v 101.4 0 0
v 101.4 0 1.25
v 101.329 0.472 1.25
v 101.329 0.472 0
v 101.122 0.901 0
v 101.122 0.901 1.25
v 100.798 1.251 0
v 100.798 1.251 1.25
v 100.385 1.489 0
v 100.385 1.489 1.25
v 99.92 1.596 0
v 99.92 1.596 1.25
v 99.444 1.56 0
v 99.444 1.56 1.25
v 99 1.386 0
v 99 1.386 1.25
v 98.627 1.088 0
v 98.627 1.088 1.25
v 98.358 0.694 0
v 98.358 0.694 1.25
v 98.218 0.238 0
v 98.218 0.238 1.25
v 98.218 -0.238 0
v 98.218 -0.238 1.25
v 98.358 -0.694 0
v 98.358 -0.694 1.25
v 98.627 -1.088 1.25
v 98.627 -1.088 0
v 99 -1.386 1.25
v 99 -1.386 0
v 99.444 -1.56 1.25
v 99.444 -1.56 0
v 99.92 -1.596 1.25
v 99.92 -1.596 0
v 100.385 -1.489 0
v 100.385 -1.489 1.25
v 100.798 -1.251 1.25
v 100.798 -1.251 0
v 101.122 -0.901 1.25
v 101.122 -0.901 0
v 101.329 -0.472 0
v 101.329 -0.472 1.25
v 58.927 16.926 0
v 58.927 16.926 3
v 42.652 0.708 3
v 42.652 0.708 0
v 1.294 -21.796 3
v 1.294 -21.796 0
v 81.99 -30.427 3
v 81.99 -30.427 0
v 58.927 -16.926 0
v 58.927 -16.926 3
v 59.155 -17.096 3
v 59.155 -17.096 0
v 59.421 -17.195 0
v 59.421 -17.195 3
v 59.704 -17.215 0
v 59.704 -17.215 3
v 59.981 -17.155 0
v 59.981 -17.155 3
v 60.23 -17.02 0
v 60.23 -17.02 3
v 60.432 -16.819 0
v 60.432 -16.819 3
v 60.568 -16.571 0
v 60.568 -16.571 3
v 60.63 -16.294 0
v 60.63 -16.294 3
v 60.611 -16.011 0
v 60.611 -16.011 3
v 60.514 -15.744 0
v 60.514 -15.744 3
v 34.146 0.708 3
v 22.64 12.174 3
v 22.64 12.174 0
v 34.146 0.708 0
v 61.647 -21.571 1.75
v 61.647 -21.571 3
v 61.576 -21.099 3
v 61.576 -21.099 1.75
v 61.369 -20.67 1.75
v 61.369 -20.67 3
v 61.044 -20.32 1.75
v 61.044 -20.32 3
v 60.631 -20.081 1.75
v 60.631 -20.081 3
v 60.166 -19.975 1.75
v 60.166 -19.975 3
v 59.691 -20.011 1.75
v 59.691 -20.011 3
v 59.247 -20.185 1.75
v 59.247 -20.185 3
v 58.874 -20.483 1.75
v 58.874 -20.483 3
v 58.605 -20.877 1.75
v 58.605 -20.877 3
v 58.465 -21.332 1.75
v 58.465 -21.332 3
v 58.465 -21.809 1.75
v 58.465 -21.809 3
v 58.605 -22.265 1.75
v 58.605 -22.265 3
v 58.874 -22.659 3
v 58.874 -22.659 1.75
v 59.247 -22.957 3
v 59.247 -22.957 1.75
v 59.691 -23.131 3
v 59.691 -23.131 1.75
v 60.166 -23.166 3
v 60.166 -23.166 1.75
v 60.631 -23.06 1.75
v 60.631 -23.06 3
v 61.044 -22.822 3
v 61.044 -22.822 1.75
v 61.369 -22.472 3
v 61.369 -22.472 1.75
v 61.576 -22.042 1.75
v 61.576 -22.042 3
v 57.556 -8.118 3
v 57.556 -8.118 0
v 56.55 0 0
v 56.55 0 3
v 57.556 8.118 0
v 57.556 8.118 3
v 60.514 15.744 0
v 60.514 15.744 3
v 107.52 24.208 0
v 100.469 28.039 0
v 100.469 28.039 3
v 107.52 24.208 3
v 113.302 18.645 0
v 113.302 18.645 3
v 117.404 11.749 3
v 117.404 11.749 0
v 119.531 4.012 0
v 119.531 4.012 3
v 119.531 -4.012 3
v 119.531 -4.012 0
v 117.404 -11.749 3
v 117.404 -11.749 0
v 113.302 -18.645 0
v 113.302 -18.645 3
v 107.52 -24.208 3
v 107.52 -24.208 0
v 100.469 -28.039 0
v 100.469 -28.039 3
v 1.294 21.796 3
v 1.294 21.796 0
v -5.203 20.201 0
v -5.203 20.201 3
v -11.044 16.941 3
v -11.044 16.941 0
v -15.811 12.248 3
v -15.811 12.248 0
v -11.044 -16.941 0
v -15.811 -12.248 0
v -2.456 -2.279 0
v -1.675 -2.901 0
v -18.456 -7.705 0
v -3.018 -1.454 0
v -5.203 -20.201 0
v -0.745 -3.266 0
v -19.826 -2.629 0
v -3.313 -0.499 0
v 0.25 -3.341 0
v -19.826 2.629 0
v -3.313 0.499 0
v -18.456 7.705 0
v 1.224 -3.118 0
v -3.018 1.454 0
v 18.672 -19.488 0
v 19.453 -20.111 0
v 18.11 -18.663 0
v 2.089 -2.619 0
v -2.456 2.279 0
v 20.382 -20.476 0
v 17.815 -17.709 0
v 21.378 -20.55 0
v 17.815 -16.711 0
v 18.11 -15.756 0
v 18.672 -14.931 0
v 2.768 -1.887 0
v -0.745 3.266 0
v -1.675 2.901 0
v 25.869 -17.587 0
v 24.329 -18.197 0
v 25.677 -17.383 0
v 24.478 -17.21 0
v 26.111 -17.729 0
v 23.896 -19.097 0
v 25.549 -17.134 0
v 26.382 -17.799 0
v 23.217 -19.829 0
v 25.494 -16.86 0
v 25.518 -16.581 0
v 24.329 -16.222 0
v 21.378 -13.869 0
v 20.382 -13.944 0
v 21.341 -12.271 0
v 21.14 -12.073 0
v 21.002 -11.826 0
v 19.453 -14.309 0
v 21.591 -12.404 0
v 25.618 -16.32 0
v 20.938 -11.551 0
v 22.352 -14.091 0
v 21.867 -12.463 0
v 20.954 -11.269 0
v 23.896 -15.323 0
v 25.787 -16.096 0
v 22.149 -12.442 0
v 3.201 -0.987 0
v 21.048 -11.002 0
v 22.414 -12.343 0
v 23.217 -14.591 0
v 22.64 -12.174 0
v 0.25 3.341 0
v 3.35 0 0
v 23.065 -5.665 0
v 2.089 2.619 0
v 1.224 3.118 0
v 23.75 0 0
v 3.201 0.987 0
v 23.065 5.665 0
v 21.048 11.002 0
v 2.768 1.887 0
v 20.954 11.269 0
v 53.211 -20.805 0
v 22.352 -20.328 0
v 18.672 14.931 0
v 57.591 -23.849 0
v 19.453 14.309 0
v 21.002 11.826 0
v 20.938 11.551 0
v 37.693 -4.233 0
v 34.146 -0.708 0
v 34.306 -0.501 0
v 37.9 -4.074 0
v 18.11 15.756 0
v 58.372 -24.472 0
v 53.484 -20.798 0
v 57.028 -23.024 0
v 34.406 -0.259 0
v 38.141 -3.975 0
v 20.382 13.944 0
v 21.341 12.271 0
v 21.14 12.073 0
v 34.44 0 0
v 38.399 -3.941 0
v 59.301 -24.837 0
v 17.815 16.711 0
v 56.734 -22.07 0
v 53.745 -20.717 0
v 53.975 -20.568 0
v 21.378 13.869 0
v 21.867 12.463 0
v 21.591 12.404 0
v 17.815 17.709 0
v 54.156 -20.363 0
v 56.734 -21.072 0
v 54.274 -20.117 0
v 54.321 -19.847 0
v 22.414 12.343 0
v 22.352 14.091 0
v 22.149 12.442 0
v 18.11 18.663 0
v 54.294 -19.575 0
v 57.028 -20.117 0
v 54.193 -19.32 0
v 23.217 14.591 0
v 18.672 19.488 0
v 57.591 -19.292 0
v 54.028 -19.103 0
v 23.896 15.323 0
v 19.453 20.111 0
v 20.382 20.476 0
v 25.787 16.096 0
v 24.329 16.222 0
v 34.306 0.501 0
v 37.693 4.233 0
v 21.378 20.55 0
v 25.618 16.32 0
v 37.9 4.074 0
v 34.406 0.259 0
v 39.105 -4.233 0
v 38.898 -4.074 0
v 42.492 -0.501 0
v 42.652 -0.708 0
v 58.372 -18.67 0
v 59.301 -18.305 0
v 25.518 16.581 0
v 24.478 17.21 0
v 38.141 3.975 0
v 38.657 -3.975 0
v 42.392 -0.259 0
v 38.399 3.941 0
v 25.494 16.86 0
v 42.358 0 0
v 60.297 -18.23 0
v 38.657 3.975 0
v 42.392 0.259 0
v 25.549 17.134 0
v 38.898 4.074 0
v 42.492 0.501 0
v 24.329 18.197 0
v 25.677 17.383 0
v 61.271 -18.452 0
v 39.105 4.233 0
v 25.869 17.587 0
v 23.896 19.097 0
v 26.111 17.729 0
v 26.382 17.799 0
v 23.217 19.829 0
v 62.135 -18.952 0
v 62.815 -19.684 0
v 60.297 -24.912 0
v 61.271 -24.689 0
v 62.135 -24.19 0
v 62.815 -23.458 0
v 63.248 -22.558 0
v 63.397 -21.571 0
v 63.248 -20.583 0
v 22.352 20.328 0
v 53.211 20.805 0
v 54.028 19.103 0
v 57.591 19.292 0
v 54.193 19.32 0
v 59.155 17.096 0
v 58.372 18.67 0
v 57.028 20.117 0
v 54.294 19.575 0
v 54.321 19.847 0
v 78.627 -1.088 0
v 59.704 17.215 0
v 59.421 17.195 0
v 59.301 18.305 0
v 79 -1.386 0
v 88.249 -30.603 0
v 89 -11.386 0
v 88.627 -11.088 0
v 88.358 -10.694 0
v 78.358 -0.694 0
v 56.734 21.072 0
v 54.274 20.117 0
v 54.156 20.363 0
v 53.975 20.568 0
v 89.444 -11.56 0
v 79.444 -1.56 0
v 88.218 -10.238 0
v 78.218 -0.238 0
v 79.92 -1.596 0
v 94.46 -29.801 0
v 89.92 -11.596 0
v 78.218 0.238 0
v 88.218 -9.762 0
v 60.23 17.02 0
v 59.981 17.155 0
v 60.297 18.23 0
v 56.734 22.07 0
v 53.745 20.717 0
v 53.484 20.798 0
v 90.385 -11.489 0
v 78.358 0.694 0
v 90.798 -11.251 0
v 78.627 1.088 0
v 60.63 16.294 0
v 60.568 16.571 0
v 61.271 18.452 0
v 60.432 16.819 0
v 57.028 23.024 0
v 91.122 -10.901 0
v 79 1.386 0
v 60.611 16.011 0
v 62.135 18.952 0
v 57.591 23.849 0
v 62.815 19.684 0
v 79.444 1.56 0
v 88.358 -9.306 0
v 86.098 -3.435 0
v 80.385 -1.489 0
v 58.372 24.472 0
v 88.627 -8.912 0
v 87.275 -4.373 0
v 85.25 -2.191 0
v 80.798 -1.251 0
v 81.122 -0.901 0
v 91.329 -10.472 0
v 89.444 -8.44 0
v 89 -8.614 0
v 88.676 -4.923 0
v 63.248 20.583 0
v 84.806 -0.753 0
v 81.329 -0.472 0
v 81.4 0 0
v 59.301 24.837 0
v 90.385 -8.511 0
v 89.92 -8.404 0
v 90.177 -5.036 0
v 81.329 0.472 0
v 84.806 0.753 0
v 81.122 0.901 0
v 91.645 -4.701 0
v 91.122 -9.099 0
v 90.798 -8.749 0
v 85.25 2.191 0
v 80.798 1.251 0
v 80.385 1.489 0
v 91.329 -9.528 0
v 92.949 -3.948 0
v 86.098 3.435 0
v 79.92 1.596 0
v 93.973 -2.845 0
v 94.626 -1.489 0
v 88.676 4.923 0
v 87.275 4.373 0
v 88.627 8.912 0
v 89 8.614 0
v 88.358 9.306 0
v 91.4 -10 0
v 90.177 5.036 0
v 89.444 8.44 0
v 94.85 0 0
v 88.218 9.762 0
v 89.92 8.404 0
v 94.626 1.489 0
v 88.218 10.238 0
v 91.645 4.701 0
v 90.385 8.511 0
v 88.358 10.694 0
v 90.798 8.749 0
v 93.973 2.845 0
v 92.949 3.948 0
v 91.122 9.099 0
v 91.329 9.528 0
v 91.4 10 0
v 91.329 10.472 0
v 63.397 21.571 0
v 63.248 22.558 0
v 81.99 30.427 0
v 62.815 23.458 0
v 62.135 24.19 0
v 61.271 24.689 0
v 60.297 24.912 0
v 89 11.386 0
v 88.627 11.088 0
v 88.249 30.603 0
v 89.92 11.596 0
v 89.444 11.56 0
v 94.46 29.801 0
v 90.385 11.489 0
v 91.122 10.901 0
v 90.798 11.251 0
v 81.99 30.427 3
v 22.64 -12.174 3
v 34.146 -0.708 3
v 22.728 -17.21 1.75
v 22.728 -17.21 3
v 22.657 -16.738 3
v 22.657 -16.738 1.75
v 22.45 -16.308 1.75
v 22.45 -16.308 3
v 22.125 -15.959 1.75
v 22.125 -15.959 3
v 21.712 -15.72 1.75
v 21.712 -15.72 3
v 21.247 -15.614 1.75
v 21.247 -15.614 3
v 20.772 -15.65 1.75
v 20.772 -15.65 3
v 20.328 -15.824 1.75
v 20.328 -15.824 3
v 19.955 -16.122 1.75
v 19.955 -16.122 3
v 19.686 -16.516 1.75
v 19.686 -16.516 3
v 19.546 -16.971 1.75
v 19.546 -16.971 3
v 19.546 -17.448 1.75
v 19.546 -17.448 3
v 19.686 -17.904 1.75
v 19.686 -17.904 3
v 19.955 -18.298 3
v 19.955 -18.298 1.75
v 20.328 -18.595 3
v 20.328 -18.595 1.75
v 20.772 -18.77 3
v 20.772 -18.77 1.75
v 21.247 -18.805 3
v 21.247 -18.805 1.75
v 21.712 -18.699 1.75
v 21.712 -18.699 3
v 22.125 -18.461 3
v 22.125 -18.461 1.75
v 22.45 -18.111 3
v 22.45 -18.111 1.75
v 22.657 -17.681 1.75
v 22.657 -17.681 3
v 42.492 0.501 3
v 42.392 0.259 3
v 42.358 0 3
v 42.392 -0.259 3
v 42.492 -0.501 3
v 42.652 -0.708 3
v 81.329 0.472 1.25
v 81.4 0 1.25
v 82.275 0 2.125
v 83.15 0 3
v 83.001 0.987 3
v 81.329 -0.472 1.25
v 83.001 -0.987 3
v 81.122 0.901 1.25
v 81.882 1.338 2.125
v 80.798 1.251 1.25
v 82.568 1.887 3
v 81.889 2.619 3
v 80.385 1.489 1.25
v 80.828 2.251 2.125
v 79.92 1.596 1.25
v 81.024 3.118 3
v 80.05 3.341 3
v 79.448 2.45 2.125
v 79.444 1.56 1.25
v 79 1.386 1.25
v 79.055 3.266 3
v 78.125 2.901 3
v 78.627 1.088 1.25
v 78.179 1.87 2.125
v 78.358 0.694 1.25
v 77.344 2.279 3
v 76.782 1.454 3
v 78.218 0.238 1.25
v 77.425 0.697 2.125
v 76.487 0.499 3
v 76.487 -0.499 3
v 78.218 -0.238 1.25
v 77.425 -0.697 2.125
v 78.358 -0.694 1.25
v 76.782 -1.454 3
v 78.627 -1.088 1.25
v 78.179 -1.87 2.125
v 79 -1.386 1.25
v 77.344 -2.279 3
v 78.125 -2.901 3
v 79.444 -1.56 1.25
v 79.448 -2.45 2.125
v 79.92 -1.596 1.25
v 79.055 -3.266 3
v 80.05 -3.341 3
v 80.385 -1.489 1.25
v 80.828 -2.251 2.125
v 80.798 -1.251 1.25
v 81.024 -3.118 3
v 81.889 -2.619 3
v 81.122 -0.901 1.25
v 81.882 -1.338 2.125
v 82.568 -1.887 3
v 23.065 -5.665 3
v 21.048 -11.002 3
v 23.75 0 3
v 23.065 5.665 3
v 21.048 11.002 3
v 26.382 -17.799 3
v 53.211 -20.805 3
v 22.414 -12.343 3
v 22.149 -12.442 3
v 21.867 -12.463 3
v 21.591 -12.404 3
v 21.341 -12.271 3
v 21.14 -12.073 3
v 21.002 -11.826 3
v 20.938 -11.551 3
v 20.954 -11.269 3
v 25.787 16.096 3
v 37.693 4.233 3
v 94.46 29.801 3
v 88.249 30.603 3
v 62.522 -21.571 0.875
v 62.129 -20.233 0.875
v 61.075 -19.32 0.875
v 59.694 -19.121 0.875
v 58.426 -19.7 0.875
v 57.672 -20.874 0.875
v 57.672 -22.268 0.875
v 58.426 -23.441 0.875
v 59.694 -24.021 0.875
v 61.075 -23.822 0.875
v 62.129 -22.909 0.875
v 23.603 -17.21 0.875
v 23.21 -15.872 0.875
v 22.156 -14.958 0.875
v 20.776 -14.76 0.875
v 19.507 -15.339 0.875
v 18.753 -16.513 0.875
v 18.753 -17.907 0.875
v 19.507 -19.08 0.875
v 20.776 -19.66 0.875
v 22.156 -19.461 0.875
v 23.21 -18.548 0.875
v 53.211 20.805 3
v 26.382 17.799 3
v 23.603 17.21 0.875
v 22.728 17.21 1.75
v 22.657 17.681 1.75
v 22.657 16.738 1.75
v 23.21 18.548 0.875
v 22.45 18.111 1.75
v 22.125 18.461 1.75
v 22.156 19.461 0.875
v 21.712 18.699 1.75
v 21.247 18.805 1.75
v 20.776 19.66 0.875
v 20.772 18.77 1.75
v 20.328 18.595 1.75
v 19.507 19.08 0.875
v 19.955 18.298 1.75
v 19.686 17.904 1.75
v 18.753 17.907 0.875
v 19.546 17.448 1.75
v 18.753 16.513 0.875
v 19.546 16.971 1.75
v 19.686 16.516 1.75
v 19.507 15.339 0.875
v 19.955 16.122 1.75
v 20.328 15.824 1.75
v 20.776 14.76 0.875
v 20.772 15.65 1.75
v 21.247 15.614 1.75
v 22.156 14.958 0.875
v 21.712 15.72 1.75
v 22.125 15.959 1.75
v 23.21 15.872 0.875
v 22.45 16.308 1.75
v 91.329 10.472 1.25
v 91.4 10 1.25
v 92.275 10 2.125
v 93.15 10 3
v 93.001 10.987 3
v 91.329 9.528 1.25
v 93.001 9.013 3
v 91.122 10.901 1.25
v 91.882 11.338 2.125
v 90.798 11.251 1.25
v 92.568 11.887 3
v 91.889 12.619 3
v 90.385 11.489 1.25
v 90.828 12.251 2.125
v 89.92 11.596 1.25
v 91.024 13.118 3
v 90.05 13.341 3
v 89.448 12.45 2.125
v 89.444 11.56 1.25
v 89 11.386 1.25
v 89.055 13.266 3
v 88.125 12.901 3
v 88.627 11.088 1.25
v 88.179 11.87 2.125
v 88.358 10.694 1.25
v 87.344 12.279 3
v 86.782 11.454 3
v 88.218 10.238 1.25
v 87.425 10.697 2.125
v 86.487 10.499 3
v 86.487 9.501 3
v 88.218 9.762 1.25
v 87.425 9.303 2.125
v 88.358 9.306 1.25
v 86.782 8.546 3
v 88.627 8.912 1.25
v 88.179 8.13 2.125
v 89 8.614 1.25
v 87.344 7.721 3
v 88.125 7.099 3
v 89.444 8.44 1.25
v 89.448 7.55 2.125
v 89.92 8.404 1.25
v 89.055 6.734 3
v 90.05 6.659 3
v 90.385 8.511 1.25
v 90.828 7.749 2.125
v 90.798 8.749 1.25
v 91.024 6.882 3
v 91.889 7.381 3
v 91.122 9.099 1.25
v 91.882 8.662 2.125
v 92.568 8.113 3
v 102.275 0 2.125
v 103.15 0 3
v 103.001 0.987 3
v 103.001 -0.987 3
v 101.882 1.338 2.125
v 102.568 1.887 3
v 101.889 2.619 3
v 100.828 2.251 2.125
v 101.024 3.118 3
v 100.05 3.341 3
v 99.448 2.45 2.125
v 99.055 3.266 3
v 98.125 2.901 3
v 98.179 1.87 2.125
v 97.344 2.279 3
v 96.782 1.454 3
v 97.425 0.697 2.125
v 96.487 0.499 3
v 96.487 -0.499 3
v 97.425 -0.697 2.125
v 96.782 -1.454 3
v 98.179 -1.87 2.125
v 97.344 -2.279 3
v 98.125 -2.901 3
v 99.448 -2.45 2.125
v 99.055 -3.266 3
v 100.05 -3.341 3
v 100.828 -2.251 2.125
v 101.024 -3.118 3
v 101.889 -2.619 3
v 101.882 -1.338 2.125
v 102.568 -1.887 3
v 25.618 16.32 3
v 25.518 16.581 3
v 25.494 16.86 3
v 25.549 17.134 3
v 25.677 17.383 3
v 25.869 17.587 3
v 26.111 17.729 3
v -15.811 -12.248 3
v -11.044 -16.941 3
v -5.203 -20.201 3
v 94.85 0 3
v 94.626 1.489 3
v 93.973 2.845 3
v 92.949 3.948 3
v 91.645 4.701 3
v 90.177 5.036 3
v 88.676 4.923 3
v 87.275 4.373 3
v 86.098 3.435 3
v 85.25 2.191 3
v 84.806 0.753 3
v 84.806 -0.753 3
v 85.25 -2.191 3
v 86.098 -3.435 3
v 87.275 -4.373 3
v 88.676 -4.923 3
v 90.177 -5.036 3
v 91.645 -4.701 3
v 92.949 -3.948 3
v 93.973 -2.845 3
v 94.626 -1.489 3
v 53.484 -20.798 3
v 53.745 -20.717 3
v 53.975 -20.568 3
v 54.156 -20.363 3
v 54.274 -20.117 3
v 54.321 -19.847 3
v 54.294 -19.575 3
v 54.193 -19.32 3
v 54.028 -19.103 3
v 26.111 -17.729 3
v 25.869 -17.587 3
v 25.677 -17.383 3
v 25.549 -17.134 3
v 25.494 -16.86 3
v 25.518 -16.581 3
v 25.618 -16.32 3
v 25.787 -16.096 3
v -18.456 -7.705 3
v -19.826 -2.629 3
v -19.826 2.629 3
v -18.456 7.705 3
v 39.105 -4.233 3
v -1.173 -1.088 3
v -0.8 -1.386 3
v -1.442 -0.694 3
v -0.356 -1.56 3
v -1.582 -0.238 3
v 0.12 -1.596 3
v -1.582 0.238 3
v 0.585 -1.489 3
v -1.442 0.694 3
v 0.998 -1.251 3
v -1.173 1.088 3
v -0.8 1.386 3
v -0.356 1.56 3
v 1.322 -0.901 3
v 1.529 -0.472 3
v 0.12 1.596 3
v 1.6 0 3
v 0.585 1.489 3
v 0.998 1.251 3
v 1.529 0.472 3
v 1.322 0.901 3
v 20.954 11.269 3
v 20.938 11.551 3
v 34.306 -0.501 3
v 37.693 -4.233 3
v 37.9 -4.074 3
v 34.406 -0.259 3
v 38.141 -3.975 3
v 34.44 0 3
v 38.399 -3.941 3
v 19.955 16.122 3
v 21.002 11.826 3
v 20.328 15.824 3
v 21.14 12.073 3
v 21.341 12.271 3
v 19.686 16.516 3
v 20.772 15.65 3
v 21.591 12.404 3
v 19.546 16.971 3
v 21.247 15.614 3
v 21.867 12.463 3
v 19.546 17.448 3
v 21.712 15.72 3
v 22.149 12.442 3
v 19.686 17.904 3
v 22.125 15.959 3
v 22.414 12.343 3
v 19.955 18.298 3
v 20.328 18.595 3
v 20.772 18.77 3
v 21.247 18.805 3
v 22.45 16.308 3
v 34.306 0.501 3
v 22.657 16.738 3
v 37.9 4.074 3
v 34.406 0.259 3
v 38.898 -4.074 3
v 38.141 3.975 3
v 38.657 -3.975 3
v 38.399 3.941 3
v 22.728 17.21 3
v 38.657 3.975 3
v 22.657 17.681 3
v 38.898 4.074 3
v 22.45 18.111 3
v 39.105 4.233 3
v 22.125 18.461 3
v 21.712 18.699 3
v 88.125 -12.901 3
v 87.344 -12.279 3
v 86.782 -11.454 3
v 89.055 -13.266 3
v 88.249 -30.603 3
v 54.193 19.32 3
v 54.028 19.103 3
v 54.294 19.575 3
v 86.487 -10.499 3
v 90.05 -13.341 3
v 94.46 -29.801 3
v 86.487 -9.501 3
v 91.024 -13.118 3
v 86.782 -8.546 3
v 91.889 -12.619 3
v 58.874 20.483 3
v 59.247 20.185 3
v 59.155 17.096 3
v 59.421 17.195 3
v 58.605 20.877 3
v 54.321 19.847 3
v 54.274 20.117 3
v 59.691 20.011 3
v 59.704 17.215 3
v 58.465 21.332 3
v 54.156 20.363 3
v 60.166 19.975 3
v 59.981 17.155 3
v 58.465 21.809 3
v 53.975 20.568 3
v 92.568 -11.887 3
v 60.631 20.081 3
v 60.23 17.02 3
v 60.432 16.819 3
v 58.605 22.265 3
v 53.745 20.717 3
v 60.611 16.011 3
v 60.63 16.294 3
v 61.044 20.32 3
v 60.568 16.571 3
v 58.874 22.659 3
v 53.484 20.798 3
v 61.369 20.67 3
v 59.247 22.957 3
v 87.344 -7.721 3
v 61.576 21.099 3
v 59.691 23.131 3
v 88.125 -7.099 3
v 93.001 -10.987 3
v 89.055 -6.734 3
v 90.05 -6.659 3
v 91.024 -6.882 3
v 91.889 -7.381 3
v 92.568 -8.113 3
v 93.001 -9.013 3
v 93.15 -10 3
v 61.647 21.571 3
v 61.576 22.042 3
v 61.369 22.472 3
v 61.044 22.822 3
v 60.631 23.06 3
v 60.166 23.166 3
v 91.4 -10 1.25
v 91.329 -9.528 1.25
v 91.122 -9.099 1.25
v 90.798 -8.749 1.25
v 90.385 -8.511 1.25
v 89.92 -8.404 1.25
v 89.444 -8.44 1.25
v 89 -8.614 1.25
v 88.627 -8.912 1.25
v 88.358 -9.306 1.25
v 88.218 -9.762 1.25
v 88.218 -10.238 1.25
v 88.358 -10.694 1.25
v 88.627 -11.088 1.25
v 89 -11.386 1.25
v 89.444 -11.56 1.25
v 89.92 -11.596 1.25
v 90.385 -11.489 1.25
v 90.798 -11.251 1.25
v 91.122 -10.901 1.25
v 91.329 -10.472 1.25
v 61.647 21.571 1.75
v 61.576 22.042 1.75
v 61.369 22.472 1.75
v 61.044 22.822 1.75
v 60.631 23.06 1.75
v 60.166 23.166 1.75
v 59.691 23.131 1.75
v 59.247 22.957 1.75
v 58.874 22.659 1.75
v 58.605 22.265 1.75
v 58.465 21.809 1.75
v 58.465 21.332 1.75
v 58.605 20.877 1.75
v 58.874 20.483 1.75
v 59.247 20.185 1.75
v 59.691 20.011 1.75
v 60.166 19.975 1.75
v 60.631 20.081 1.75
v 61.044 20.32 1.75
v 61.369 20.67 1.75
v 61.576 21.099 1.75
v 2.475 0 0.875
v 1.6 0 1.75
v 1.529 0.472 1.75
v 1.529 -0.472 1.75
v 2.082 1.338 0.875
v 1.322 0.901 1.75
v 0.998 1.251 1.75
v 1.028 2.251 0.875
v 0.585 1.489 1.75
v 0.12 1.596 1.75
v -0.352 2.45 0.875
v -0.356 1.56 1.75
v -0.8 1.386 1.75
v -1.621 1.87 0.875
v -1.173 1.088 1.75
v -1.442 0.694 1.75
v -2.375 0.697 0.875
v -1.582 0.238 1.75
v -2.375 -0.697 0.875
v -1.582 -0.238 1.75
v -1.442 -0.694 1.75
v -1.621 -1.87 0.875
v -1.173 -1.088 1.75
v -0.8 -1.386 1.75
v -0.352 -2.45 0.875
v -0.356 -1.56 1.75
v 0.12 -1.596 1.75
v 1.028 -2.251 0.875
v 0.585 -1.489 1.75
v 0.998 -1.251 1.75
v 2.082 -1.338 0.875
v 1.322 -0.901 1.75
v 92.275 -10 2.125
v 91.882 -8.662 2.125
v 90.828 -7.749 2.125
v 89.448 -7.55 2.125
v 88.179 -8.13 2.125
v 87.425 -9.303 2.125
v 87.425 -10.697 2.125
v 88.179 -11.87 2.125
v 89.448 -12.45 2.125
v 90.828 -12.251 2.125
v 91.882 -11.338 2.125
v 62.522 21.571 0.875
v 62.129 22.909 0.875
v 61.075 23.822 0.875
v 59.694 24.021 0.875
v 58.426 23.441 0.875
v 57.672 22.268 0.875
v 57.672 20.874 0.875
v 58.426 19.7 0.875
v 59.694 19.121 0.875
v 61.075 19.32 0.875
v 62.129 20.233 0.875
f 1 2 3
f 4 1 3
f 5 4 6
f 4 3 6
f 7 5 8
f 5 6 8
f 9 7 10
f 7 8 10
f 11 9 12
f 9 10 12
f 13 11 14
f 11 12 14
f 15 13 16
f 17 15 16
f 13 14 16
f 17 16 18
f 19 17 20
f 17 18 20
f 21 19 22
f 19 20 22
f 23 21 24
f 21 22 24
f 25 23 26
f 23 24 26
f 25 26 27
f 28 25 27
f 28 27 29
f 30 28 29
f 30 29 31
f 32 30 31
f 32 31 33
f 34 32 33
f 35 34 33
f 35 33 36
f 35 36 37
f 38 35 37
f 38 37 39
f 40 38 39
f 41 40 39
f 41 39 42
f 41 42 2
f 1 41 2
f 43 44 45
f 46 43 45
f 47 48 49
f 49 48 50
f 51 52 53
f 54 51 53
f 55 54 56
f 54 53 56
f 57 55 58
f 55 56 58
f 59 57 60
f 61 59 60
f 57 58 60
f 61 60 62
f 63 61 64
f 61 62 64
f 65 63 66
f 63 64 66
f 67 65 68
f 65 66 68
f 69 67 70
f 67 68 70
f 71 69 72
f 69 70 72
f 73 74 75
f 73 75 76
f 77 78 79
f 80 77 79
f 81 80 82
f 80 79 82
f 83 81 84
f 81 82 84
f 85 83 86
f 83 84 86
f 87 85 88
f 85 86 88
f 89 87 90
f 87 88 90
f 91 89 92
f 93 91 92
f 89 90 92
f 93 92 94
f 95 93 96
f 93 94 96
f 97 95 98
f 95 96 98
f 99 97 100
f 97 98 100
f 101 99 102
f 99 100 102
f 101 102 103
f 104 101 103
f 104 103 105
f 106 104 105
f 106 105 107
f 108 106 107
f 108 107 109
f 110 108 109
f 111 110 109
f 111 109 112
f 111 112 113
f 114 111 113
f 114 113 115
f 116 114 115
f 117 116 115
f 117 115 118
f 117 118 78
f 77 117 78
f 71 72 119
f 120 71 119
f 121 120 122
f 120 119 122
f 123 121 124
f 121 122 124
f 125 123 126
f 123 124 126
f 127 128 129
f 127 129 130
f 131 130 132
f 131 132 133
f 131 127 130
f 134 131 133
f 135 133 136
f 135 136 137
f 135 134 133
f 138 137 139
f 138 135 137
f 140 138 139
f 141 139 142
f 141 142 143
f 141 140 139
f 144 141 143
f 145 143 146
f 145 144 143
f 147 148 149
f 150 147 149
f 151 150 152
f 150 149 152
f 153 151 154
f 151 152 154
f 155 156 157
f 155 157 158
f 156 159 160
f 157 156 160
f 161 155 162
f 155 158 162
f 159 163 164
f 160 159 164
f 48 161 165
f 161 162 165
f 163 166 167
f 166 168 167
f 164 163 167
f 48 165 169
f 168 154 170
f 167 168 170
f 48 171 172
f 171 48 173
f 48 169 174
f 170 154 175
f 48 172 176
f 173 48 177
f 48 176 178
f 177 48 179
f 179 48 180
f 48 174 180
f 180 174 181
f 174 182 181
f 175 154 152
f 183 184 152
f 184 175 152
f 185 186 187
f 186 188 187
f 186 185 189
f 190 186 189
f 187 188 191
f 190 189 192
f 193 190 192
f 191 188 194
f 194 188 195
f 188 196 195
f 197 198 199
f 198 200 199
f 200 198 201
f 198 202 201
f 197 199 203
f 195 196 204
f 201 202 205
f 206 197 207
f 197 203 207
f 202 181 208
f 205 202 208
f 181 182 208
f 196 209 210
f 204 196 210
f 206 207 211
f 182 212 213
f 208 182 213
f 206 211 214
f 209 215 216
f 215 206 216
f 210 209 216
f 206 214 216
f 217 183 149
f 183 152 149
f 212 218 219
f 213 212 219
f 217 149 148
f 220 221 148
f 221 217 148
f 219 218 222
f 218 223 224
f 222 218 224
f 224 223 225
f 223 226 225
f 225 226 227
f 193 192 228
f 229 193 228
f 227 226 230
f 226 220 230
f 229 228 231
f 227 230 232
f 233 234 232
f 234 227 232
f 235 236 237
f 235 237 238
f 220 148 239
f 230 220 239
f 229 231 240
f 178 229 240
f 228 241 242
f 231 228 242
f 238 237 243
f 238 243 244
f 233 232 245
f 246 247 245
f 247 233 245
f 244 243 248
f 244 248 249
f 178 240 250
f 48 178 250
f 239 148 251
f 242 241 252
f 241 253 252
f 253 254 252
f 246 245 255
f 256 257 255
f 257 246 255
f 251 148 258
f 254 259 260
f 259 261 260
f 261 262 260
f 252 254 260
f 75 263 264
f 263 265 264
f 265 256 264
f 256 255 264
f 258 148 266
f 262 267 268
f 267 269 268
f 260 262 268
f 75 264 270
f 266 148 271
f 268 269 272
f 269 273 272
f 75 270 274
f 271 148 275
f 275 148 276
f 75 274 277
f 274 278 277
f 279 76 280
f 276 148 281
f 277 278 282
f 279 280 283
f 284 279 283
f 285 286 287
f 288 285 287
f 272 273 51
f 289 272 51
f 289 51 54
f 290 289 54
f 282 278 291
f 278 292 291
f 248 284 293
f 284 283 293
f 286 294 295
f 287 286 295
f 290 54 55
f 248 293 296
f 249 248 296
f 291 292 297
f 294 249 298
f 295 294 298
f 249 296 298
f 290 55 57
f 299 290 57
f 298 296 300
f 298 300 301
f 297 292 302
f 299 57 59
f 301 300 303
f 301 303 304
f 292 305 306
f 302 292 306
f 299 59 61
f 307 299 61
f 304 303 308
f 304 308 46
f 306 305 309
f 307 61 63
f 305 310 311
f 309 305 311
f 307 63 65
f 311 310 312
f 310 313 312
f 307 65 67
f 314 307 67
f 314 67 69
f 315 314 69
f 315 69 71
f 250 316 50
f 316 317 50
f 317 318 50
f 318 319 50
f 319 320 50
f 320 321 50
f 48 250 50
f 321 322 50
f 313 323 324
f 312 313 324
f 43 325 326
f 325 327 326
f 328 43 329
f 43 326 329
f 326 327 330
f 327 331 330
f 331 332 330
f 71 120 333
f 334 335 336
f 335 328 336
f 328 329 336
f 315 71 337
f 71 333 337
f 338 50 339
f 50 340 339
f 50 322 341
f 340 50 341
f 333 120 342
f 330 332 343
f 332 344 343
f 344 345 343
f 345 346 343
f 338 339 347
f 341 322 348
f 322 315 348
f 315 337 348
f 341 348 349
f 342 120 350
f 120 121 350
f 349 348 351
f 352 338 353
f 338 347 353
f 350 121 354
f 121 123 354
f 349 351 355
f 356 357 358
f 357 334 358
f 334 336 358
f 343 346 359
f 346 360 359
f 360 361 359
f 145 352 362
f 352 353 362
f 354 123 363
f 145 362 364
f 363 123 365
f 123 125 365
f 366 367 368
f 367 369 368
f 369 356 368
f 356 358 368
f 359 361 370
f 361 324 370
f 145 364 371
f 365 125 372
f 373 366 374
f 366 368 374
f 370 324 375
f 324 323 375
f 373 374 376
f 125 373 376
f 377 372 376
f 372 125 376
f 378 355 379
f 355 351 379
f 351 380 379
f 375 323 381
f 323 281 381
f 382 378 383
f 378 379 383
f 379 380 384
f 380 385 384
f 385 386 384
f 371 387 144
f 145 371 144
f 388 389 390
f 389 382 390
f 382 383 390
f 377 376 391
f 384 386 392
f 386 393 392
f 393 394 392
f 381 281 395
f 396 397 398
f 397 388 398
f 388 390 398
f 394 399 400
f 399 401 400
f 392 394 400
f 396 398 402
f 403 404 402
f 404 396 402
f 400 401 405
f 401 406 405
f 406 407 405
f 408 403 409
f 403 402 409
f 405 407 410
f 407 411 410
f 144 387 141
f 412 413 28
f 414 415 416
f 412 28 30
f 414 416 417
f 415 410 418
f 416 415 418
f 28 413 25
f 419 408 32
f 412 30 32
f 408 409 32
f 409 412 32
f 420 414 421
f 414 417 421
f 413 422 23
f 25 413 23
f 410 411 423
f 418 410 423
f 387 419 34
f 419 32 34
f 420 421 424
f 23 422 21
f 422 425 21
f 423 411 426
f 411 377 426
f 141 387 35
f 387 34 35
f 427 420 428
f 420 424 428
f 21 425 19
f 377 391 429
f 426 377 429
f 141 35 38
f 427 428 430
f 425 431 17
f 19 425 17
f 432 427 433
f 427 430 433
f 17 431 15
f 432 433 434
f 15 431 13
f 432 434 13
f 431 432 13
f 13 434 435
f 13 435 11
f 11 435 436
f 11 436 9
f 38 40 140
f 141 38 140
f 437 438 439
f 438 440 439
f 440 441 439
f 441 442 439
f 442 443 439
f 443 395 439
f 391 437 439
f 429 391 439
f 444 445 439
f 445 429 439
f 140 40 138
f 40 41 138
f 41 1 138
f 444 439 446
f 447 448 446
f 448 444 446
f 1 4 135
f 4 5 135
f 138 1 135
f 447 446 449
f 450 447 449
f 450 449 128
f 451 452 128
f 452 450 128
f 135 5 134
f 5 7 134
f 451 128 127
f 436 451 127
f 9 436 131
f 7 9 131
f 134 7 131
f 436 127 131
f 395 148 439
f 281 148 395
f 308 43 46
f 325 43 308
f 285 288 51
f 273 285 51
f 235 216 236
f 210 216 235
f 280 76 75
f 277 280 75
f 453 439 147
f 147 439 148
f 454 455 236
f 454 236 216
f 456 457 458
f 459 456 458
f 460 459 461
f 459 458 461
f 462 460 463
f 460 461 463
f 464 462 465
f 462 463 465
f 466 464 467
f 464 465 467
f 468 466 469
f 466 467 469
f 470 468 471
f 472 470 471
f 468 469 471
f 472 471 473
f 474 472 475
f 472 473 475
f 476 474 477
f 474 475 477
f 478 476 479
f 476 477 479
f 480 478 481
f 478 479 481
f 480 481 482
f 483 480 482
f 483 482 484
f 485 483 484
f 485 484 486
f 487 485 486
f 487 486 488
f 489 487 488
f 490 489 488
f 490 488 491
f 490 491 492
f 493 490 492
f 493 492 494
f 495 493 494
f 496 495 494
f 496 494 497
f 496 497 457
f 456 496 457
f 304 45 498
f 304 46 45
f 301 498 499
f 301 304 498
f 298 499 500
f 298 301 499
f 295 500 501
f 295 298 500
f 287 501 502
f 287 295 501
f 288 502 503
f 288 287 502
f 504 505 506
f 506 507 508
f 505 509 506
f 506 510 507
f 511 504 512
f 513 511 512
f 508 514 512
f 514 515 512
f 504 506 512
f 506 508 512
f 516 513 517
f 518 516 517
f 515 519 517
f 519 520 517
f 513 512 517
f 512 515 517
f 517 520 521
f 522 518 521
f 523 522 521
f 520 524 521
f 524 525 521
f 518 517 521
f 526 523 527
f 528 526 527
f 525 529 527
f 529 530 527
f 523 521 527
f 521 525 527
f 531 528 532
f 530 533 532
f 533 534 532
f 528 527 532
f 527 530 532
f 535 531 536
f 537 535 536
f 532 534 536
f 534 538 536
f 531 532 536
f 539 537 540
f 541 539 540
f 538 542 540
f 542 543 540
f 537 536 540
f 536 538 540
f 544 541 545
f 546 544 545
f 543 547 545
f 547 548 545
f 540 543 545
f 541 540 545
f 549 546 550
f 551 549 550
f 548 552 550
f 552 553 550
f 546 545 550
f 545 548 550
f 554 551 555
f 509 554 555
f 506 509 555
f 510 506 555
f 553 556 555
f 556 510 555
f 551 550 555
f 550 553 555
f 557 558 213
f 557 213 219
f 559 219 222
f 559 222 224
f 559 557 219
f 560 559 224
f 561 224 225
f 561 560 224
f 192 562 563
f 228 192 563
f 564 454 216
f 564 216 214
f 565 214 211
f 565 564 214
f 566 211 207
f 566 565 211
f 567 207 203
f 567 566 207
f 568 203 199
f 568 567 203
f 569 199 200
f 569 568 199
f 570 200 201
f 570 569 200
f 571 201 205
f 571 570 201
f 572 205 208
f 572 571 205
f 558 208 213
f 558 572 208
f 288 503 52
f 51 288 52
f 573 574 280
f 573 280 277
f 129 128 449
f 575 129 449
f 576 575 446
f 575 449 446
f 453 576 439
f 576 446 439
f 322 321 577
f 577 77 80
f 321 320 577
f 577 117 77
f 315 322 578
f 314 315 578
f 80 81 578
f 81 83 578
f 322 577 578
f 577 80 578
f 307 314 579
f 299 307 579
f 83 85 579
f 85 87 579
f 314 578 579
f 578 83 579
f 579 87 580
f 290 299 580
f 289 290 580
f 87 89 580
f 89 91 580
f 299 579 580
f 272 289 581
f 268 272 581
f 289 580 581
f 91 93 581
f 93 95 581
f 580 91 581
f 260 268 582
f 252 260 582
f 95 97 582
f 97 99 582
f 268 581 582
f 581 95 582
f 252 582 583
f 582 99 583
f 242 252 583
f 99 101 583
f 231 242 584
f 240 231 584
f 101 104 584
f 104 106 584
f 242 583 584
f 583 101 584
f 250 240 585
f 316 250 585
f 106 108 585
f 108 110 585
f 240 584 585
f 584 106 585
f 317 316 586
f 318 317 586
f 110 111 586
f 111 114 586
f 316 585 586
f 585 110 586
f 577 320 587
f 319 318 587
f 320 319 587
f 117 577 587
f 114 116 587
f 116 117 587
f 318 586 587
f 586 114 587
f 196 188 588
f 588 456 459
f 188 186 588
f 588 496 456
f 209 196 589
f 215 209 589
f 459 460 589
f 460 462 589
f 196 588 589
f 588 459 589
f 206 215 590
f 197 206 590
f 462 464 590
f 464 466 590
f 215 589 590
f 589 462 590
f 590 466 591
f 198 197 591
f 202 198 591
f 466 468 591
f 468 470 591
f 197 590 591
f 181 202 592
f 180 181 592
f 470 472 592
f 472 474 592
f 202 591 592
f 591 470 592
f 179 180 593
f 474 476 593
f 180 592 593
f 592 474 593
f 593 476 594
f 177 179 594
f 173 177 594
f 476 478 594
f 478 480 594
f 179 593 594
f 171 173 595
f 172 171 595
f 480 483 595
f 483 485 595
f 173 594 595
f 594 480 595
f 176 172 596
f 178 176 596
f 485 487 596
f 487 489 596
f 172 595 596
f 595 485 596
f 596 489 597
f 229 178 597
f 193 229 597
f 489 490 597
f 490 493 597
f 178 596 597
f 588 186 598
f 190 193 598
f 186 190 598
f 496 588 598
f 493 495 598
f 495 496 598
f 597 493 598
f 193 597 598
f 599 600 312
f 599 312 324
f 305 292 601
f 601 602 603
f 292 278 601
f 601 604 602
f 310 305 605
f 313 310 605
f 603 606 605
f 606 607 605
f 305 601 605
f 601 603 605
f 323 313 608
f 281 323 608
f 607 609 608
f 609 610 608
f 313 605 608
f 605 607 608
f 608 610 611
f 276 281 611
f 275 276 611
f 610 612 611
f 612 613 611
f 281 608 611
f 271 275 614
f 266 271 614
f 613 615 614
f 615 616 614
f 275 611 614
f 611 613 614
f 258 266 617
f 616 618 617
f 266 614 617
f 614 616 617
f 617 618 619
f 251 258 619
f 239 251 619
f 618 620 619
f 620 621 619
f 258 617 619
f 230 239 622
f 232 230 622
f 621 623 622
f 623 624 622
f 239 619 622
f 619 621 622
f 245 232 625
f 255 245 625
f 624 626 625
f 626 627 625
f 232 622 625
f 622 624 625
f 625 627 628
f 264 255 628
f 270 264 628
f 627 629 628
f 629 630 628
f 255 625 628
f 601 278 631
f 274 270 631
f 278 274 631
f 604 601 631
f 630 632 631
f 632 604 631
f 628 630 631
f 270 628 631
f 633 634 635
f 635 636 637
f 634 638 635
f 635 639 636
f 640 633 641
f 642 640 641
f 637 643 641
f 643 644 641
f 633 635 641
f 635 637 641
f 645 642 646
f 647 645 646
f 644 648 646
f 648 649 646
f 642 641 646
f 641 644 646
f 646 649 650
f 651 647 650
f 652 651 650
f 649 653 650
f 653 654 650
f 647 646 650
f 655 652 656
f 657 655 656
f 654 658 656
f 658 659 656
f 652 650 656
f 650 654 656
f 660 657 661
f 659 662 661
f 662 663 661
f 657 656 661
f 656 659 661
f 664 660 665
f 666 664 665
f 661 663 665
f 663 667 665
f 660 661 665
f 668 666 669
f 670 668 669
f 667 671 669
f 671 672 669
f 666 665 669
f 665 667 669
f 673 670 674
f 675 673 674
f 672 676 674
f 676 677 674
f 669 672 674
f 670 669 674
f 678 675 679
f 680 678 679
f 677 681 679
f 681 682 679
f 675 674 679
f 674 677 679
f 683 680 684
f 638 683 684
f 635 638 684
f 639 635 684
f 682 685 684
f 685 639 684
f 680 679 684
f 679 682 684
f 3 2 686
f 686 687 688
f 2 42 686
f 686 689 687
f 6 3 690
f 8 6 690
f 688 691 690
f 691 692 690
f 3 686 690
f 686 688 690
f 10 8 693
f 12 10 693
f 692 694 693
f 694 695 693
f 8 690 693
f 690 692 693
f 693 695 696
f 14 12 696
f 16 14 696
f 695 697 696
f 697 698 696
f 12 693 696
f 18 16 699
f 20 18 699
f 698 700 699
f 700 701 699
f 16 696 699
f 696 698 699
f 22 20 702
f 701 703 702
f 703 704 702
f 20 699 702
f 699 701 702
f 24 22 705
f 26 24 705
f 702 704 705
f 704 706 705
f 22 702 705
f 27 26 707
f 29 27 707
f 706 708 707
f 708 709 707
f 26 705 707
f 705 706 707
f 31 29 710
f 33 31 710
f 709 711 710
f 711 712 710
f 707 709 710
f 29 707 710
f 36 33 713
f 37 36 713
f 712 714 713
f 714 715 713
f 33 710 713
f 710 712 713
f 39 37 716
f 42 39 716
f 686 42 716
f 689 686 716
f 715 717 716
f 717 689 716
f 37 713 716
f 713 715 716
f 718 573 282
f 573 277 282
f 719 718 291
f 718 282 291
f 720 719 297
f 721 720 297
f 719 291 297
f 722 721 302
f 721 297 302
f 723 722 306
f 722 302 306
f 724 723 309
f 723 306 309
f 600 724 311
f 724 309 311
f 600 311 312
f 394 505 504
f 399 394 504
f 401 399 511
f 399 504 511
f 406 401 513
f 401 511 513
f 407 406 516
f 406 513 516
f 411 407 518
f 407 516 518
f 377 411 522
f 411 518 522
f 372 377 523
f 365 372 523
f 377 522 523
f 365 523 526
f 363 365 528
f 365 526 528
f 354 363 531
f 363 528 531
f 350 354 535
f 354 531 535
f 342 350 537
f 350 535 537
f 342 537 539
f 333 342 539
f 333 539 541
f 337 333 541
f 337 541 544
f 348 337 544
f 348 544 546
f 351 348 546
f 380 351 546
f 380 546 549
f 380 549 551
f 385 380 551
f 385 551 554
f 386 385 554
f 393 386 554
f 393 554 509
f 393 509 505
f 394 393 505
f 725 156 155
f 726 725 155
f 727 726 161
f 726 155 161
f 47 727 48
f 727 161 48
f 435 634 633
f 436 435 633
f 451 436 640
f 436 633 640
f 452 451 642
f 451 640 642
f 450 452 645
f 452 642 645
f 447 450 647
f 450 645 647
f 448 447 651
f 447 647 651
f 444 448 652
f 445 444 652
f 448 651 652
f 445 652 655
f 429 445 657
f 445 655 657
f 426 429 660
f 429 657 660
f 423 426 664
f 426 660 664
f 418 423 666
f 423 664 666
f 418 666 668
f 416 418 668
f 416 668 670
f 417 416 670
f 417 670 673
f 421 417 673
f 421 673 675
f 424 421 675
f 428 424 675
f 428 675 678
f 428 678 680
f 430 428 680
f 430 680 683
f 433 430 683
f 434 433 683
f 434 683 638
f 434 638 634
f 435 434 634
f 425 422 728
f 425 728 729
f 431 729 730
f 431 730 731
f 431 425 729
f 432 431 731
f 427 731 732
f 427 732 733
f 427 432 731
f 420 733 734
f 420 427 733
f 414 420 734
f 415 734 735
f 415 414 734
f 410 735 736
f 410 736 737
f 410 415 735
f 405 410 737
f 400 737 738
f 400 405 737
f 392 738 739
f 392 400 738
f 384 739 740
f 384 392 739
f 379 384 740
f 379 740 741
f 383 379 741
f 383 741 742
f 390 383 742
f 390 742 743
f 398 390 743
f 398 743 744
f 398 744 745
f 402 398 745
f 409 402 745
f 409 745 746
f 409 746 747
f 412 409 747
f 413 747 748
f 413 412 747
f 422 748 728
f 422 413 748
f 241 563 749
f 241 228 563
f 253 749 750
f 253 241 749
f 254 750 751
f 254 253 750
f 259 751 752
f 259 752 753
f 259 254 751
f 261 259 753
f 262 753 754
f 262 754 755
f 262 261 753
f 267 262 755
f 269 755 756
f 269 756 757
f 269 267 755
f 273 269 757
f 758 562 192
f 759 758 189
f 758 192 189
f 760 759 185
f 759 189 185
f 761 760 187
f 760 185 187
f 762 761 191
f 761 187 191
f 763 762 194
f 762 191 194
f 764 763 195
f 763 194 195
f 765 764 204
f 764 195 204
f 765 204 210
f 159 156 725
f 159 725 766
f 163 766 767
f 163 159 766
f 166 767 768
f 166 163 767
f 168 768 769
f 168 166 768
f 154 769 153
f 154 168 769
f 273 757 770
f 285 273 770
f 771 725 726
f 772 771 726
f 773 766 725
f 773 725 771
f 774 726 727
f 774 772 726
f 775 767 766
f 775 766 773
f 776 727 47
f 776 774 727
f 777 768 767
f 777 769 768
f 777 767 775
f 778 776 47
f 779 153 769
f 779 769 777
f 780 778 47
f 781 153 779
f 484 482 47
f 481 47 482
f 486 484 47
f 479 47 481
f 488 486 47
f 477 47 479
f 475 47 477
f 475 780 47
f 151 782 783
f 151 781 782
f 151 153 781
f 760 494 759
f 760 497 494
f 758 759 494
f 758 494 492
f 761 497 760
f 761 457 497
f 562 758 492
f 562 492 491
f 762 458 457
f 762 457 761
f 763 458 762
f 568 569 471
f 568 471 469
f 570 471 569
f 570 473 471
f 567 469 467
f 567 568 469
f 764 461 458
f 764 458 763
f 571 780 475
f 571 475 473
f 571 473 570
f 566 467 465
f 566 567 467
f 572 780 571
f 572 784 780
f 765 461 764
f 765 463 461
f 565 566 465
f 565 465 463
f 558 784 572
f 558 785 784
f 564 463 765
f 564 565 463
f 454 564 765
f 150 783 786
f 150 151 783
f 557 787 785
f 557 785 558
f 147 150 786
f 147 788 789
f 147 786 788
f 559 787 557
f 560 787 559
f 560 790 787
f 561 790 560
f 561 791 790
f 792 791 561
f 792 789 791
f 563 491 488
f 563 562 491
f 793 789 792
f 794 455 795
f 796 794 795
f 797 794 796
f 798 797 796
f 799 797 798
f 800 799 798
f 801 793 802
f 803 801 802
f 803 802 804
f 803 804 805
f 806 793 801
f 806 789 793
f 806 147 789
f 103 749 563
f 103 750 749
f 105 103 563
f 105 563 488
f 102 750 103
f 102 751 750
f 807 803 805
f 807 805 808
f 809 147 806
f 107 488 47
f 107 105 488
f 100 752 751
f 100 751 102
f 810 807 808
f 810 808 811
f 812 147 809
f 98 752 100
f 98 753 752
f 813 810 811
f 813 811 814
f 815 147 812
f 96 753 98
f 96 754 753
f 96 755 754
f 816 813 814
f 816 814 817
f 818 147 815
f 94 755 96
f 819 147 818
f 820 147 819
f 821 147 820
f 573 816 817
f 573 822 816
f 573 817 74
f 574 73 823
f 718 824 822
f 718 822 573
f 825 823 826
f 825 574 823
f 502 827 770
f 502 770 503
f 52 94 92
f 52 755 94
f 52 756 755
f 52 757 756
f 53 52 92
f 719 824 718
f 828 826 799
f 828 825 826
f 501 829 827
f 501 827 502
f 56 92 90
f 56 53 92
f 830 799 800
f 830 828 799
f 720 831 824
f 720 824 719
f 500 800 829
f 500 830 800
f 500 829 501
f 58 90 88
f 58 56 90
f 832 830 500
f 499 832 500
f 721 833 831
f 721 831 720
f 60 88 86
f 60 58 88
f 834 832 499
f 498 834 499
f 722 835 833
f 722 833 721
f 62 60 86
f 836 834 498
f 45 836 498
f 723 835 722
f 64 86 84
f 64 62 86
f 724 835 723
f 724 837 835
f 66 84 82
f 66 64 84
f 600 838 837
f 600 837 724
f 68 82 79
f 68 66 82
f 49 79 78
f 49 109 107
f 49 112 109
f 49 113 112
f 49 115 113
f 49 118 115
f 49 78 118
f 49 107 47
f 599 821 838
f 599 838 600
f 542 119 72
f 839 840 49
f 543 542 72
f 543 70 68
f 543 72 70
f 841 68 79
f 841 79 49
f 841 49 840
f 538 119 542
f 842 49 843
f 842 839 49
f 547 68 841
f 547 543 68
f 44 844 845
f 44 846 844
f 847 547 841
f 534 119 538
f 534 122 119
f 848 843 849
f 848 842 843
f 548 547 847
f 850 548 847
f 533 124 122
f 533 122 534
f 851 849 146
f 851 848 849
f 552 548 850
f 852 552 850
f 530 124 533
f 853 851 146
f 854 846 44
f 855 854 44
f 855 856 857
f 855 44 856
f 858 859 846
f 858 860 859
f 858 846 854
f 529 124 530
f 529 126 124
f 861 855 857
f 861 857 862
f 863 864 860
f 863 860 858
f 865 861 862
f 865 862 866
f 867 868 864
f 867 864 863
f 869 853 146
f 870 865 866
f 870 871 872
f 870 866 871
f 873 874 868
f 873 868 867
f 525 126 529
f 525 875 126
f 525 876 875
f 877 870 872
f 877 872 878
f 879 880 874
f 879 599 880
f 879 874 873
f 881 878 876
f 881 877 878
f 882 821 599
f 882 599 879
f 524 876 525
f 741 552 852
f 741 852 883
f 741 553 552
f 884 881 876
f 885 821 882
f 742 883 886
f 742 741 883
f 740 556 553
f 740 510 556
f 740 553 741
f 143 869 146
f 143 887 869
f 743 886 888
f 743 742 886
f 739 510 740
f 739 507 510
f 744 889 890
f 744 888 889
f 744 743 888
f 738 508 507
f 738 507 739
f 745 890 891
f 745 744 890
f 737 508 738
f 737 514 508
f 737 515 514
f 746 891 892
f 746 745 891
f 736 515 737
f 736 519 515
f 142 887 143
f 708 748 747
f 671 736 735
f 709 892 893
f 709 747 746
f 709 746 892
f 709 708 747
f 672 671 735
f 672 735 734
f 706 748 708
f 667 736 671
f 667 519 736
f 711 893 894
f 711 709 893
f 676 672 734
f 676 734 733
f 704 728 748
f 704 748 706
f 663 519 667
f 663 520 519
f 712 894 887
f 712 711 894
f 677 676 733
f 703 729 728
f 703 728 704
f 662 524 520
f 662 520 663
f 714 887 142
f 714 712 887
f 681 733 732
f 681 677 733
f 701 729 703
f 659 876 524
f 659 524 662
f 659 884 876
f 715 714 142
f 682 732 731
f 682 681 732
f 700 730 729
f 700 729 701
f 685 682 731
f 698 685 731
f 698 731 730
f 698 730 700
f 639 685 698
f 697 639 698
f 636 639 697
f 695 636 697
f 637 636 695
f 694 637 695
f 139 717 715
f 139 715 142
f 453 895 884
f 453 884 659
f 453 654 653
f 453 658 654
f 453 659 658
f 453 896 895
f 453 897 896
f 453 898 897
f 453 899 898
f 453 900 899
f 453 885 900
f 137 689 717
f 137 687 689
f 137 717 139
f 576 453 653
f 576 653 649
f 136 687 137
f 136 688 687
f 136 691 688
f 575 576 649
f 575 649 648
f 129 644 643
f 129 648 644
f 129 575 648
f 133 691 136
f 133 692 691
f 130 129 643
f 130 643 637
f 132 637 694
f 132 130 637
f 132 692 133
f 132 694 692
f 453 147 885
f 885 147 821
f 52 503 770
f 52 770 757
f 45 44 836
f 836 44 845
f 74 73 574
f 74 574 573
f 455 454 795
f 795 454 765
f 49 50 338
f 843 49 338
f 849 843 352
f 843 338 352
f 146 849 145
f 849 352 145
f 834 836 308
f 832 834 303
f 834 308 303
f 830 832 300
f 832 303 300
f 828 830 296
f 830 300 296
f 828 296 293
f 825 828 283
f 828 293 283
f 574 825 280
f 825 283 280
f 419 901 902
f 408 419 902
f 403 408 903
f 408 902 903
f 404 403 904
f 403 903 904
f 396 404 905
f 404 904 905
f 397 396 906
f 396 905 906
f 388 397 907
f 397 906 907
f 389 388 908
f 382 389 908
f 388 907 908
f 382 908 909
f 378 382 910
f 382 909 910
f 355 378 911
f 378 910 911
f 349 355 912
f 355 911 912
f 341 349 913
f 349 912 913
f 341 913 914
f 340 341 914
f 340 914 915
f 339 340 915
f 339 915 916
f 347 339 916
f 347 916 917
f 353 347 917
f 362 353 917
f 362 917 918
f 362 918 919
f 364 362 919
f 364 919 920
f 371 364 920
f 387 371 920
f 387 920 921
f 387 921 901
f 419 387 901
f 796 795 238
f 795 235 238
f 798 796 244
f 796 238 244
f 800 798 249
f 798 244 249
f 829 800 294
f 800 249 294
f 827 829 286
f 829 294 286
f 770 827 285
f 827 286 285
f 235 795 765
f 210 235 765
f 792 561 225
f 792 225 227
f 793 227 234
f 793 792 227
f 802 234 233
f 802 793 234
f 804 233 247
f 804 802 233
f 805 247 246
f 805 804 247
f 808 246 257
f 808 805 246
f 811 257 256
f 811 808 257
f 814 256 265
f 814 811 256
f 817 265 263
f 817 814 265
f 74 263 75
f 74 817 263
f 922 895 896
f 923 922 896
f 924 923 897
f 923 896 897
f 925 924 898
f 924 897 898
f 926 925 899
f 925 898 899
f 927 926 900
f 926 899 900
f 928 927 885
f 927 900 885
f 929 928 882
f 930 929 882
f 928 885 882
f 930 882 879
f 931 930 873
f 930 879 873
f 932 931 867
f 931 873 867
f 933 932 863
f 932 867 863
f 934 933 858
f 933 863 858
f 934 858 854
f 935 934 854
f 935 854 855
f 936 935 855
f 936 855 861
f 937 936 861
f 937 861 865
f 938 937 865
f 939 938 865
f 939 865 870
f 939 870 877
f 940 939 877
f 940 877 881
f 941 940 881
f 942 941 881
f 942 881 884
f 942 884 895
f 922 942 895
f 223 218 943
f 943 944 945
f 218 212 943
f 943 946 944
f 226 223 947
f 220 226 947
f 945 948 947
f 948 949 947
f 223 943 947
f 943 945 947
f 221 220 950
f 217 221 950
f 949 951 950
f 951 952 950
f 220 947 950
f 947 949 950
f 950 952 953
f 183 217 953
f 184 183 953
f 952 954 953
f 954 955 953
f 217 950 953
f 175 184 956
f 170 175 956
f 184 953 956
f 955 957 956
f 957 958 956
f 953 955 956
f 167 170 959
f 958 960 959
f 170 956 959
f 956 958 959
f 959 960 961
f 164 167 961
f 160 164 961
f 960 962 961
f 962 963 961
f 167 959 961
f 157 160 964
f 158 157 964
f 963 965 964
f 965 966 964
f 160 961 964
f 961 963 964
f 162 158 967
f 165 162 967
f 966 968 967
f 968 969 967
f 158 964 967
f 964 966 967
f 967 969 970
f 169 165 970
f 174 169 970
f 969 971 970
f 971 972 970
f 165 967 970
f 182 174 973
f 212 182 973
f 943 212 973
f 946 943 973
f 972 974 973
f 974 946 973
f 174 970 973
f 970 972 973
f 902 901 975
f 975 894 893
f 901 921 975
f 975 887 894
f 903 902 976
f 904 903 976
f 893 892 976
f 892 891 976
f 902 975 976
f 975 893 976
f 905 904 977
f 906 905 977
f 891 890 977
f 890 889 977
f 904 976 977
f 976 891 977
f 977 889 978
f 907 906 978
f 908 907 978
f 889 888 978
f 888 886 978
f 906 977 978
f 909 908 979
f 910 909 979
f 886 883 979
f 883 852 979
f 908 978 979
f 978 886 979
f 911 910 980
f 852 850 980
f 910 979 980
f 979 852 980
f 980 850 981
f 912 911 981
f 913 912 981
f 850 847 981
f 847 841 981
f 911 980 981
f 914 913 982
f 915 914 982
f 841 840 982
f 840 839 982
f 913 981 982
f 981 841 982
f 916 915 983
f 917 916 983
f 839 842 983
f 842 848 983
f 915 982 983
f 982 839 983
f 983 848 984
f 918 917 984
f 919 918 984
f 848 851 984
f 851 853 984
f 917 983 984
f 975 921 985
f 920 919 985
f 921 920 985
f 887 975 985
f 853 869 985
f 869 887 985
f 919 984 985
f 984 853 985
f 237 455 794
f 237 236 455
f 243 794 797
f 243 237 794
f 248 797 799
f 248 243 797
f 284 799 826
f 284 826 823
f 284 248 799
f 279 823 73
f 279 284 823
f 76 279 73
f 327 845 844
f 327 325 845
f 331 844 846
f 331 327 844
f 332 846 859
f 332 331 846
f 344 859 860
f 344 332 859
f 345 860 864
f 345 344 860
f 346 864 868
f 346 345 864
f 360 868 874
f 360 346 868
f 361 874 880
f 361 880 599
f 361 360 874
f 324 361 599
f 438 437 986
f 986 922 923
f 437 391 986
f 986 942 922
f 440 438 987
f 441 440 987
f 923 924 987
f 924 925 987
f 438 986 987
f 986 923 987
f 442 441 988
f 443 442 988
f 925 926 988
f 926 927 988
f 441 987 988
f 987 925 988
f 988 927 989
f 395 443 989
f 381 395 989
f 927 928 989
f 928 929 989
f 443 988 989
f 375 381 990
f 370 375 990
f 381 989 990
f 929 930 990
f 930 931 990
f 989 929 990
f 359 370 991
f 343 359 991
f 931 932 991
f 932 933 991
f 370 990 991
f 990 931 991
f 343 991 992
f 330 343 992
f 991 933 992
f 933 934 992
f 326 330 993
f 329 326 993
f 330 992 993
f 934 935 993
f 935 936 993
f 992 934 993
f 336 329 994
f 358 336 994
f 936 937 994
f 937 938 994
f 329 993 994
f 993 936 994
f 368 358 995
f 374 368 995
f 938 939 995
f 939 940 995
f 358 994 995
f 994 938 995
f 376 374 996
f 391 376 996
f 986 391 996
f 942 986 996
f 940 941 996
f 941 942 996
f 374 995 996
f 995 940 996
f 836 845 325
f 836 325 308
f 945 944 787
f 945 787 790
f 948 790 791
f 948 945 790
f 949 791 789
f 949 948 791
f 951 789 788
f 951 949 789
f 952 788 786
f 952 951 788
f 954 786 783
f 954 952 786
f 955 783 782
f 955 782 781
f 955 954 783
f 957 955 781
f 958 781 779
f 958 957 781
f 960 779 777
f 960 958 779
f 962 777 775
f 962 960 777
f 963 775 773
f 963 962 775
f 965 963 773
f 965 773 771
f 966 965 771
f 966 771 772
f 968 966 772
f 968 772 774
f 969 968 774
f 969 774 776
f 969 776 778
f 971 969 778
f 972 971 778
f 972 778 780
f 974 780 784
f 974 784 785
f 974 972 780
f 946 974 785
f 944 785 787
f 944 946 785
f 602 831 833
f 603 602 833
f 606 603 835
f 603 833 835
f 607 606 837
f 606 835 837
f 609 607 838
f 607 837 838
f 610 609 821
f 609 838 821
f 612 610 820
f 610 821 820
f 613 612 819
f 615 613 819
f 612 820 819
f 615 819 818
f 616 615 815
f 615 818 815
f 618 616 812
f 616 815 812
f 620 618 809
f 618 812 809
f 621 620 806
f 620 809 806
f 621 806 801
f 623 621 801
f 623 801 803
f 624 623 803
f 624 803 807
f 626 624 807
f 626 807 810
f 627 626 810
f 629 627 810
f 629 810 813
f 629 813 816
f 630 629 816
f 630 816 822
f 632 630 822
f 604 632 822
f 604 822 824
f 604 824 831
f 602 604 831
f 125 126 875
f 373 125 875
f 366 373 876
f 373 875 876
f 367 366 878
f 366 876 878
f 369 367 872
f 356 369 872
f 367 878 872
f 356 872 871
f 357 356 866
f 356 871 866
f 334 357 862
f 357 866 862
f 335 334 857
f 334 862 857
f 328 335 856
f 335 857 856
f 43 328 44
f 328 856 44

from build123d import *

# Parameters (mm, degrees)
SKETCH_1_R          = 1.6
SKETCH_1_R_2        = 5.05
EXTRUDE_1_DEPTH     = 3
SKETCH_2_R          = 1.6
CUT_EXTRUDE_1_DEPTH = 124.535581919
SKETCH_3_R          = 1.6
CUT_EXTRUDE_2_DEPTH = 124.535581919
FILLET_1_R          = 1
EXTRUDE_START       = -3
EXTRUDE_2_DEPTH     = 3
CHAMFER_1_SIZE      = 1.75
CHAMFER_2_SIZE      = 1.75


with BuildPart() as part:
    # ｽｹｯﾁ1 → ﾎﾞｽ - 押し出し1 (new body)
    with BuildSketch(Plane.XY):
        with BuildLine():
            Line((-2.227171492, 19.875605831), (86.459242762, 29.813408746))
            ThreePointArc((86.459242762, 29.813408746), (119.8, 0), (86.459242762, -29.813408746))
            Line((86.459242762, -29.813408746), (-2.227171492, -19.875605831))
            ThreePointArc((-2.227171492, -19.875605831), (-20, 0), (-2.227171492, 19.875605831))
        make_face()
        Circle(SKETCH_1_R, mode=Mode.SUBTRACT)
        with Locations((89.8, 0)):
            Circle(SKETCH_1_R_2, mode=Mode.SUBTRACT)
    extrude(amount=EXTRUDE_1_DEPTH)

    # ｽｹｯﾁ2 → ｶｯﾄ - 押し出し1 (cut, through all)
    with BuildSketch(Plane.XY.offset(3)):
        with Locations((89.8, 10)):
            Circle(SKETCH_2_R)
        with Locations((99.8, 0)):
            Circle(SKETCH_2_R)
        with Locations((89.8, -10)):
            Circle(SKETCH_2_R)
        with Locations((79.8, 0)):
            Circle(SKETCH_2_R)
    extrude(amount=-CUT_EXTRUDE_1_DEPTH, mode=Mode.SUBTRACT)

    # ｽｹｯﾁ3 → ｶｯﾄ - 押し出し2 (cut, through all)
    with BuildSketch(Plane.XY.offset(3)):
        with Locations((21.127828075, 17.209804787)):
            Circle(SKETCH_3_R)
        with Locations((21.127828075, -17.209804787)):
            Circle(SKETCH_3_R)
        with Locations((60.046685431, -21.570877871)):
            Circle(SKETCH_3_R)
        with Locations((60.046685431, 21.570877871)):
            Circle(SKETCH_3_R)
        Polygon((24.311632117, 17.566567628), (56.056085363, 21.123709076), (38.398951009, 3.529263334), align=None)
        Polygon((24.311632117, -17.566567628), (56.056085363, -21.123709076), (38.398951009, -3.529263334), align=None)
        with BuildLine():
            Line((22.640031329, 12.173707016), (34.857112989, 0))
            Line((34.857112989, 0), (22.640031329, -12.173707016))
            ThreePointArc((22.640031329, -12.173707016), (21.34147622, -12.270762122), (21.047953505, -11.002097675))
            ThreePointArc((21.047953505, -11.002097675), (23.75, 0), (21.047953505, 11.002097675))
            ThreePointArc((21.047953505, 11.002097675), (21.34147622, 12.270762122), (22.640031329, 12.173707016))
        make_face()
        with BuildLine():
            Line((58.927113914, 16.926017866), (41.940789029, 0))
            Line((41.940789029, 0), (58.927113914, -16.926017866))
            ThreePointArc((58.927113914, -16.926017866), (60.230336409, -17.019617306), (60.513751544, -15.744146574))
            ThreePointArc((60.513751544, -15.744146574), (56.55, 0), (60.513751544, 15.744146574))
            ThreePointArc((60.513751544, 15.744146574), (60.230336409, 17.019617306), (58.927113914, 16.926017866))
        make_face()
    extrude(amount=-CUT_EXTRUDE_2_DEPTH, mode=Mode.SUBTRACT)

    # ﾌｨﾚｯﾄ1
    fillet_1_edges = [part.edges().sort_by_distance(p)[0] for p in [
        (56.056085363, 21.123709076, 1.5),
        (38.398951009, 3.529263334, 1.5),
        (24.311632117, 17.566567628, 1.5),
        (41.940789029, 0, 1.5),
        (24.311632117, -17.566567628, 1.5),
        (38.398951009, -3.529263334, 1.5),
        (56.056085363, -21.123709076, 1.5),
        (34.857112989, 0, 1.5),
    ]]
    fillet(fillet_1_edges, radius=FILLET_1_R)

    # ｽｹｯﾁ4 → ﾎﾞｽ - 押し出し2 (add)
    with BuildSketch(Plane.XY.offset(3).offset(EXTRUDE_START)):
        with BuildLine():
            Line((81.98967358, 30.426942029), (1.294053754, 21.796225015))
            ThreePointArc((1.294053754, 21.796225015), (-8.232619041, 18.767269305), (-15.81095889, 12.248003061))
            ThreePointArc((-15.81095889, 12.248003061), (-9.792273379, 17.438789582), (-2.227171492, 19.875605831))
            Line((-2.227171492, 19.875605831), (86.459242762, 29.813408746))
            ThreePointArc((86.459242762, 29.813408746), (93.570181832, 29.762152626), (100.46928661, 28.038657657))
            ThreePointArc((100.46928661, 28.038657657), (91.370486749, 30.323854341), (81.98967358, 30.426942029))
        make_face()
        with BuildLine():
            ThreePointArc((-2.227171492, -19.875605831), (-9.792273379, -17.438789582), (-15.81095889, -12.248003061))
            ThreePointArc((-15.81095889, -12.248003061), (-8.232619041, -18.767269305), (1.294053754, -21.796225015))
            Line((1.294053754, -21.796225015), (81.98967358, -30.426942029))
            ThreePointArc((81.98967358, -30.426942029), (91.370486749, -30.323854341), (100.46928661, -28.038657657))
            ThreePointArc((100.46928661, -28.038657657), (93.570181832, -29.762152626), (86.459242762, -29.813408746))
            Line((86.459242762, -29.813408746), (-2.227171492, -19.875605831))
        make_face()
    extrude(amount=EXTRUDE_2_DEPTH)

    # 面取り1
    chamfer_1_edges = [part.edges().sort_by_distance(p)[0] for p in [
        (-1.6, 0, 0),
        (19.527828075, -17.209804787, 0),
        (58.446685431, -21.570877871, 0),
        (58.446685431, 21.570877871, 0),
        (19.527828075, 17.209804787, 0),
    ]]
    chamfer(chamfer_1_edges, length=CHAMFER_1_SIZE)

    # 面取り2
    chamfer_2_edges = [part.edges().sort_by_distance(p)[0] for p in [
        (88.2, 10, 3),
        (98.2, 0, 3),
        (88.2, -10, 3),
        (78.2, 0, 3),
    ]]
    chamfer(chamfer_2_edges, length=CHAMFER_2_SIZE)


solid = part.part
